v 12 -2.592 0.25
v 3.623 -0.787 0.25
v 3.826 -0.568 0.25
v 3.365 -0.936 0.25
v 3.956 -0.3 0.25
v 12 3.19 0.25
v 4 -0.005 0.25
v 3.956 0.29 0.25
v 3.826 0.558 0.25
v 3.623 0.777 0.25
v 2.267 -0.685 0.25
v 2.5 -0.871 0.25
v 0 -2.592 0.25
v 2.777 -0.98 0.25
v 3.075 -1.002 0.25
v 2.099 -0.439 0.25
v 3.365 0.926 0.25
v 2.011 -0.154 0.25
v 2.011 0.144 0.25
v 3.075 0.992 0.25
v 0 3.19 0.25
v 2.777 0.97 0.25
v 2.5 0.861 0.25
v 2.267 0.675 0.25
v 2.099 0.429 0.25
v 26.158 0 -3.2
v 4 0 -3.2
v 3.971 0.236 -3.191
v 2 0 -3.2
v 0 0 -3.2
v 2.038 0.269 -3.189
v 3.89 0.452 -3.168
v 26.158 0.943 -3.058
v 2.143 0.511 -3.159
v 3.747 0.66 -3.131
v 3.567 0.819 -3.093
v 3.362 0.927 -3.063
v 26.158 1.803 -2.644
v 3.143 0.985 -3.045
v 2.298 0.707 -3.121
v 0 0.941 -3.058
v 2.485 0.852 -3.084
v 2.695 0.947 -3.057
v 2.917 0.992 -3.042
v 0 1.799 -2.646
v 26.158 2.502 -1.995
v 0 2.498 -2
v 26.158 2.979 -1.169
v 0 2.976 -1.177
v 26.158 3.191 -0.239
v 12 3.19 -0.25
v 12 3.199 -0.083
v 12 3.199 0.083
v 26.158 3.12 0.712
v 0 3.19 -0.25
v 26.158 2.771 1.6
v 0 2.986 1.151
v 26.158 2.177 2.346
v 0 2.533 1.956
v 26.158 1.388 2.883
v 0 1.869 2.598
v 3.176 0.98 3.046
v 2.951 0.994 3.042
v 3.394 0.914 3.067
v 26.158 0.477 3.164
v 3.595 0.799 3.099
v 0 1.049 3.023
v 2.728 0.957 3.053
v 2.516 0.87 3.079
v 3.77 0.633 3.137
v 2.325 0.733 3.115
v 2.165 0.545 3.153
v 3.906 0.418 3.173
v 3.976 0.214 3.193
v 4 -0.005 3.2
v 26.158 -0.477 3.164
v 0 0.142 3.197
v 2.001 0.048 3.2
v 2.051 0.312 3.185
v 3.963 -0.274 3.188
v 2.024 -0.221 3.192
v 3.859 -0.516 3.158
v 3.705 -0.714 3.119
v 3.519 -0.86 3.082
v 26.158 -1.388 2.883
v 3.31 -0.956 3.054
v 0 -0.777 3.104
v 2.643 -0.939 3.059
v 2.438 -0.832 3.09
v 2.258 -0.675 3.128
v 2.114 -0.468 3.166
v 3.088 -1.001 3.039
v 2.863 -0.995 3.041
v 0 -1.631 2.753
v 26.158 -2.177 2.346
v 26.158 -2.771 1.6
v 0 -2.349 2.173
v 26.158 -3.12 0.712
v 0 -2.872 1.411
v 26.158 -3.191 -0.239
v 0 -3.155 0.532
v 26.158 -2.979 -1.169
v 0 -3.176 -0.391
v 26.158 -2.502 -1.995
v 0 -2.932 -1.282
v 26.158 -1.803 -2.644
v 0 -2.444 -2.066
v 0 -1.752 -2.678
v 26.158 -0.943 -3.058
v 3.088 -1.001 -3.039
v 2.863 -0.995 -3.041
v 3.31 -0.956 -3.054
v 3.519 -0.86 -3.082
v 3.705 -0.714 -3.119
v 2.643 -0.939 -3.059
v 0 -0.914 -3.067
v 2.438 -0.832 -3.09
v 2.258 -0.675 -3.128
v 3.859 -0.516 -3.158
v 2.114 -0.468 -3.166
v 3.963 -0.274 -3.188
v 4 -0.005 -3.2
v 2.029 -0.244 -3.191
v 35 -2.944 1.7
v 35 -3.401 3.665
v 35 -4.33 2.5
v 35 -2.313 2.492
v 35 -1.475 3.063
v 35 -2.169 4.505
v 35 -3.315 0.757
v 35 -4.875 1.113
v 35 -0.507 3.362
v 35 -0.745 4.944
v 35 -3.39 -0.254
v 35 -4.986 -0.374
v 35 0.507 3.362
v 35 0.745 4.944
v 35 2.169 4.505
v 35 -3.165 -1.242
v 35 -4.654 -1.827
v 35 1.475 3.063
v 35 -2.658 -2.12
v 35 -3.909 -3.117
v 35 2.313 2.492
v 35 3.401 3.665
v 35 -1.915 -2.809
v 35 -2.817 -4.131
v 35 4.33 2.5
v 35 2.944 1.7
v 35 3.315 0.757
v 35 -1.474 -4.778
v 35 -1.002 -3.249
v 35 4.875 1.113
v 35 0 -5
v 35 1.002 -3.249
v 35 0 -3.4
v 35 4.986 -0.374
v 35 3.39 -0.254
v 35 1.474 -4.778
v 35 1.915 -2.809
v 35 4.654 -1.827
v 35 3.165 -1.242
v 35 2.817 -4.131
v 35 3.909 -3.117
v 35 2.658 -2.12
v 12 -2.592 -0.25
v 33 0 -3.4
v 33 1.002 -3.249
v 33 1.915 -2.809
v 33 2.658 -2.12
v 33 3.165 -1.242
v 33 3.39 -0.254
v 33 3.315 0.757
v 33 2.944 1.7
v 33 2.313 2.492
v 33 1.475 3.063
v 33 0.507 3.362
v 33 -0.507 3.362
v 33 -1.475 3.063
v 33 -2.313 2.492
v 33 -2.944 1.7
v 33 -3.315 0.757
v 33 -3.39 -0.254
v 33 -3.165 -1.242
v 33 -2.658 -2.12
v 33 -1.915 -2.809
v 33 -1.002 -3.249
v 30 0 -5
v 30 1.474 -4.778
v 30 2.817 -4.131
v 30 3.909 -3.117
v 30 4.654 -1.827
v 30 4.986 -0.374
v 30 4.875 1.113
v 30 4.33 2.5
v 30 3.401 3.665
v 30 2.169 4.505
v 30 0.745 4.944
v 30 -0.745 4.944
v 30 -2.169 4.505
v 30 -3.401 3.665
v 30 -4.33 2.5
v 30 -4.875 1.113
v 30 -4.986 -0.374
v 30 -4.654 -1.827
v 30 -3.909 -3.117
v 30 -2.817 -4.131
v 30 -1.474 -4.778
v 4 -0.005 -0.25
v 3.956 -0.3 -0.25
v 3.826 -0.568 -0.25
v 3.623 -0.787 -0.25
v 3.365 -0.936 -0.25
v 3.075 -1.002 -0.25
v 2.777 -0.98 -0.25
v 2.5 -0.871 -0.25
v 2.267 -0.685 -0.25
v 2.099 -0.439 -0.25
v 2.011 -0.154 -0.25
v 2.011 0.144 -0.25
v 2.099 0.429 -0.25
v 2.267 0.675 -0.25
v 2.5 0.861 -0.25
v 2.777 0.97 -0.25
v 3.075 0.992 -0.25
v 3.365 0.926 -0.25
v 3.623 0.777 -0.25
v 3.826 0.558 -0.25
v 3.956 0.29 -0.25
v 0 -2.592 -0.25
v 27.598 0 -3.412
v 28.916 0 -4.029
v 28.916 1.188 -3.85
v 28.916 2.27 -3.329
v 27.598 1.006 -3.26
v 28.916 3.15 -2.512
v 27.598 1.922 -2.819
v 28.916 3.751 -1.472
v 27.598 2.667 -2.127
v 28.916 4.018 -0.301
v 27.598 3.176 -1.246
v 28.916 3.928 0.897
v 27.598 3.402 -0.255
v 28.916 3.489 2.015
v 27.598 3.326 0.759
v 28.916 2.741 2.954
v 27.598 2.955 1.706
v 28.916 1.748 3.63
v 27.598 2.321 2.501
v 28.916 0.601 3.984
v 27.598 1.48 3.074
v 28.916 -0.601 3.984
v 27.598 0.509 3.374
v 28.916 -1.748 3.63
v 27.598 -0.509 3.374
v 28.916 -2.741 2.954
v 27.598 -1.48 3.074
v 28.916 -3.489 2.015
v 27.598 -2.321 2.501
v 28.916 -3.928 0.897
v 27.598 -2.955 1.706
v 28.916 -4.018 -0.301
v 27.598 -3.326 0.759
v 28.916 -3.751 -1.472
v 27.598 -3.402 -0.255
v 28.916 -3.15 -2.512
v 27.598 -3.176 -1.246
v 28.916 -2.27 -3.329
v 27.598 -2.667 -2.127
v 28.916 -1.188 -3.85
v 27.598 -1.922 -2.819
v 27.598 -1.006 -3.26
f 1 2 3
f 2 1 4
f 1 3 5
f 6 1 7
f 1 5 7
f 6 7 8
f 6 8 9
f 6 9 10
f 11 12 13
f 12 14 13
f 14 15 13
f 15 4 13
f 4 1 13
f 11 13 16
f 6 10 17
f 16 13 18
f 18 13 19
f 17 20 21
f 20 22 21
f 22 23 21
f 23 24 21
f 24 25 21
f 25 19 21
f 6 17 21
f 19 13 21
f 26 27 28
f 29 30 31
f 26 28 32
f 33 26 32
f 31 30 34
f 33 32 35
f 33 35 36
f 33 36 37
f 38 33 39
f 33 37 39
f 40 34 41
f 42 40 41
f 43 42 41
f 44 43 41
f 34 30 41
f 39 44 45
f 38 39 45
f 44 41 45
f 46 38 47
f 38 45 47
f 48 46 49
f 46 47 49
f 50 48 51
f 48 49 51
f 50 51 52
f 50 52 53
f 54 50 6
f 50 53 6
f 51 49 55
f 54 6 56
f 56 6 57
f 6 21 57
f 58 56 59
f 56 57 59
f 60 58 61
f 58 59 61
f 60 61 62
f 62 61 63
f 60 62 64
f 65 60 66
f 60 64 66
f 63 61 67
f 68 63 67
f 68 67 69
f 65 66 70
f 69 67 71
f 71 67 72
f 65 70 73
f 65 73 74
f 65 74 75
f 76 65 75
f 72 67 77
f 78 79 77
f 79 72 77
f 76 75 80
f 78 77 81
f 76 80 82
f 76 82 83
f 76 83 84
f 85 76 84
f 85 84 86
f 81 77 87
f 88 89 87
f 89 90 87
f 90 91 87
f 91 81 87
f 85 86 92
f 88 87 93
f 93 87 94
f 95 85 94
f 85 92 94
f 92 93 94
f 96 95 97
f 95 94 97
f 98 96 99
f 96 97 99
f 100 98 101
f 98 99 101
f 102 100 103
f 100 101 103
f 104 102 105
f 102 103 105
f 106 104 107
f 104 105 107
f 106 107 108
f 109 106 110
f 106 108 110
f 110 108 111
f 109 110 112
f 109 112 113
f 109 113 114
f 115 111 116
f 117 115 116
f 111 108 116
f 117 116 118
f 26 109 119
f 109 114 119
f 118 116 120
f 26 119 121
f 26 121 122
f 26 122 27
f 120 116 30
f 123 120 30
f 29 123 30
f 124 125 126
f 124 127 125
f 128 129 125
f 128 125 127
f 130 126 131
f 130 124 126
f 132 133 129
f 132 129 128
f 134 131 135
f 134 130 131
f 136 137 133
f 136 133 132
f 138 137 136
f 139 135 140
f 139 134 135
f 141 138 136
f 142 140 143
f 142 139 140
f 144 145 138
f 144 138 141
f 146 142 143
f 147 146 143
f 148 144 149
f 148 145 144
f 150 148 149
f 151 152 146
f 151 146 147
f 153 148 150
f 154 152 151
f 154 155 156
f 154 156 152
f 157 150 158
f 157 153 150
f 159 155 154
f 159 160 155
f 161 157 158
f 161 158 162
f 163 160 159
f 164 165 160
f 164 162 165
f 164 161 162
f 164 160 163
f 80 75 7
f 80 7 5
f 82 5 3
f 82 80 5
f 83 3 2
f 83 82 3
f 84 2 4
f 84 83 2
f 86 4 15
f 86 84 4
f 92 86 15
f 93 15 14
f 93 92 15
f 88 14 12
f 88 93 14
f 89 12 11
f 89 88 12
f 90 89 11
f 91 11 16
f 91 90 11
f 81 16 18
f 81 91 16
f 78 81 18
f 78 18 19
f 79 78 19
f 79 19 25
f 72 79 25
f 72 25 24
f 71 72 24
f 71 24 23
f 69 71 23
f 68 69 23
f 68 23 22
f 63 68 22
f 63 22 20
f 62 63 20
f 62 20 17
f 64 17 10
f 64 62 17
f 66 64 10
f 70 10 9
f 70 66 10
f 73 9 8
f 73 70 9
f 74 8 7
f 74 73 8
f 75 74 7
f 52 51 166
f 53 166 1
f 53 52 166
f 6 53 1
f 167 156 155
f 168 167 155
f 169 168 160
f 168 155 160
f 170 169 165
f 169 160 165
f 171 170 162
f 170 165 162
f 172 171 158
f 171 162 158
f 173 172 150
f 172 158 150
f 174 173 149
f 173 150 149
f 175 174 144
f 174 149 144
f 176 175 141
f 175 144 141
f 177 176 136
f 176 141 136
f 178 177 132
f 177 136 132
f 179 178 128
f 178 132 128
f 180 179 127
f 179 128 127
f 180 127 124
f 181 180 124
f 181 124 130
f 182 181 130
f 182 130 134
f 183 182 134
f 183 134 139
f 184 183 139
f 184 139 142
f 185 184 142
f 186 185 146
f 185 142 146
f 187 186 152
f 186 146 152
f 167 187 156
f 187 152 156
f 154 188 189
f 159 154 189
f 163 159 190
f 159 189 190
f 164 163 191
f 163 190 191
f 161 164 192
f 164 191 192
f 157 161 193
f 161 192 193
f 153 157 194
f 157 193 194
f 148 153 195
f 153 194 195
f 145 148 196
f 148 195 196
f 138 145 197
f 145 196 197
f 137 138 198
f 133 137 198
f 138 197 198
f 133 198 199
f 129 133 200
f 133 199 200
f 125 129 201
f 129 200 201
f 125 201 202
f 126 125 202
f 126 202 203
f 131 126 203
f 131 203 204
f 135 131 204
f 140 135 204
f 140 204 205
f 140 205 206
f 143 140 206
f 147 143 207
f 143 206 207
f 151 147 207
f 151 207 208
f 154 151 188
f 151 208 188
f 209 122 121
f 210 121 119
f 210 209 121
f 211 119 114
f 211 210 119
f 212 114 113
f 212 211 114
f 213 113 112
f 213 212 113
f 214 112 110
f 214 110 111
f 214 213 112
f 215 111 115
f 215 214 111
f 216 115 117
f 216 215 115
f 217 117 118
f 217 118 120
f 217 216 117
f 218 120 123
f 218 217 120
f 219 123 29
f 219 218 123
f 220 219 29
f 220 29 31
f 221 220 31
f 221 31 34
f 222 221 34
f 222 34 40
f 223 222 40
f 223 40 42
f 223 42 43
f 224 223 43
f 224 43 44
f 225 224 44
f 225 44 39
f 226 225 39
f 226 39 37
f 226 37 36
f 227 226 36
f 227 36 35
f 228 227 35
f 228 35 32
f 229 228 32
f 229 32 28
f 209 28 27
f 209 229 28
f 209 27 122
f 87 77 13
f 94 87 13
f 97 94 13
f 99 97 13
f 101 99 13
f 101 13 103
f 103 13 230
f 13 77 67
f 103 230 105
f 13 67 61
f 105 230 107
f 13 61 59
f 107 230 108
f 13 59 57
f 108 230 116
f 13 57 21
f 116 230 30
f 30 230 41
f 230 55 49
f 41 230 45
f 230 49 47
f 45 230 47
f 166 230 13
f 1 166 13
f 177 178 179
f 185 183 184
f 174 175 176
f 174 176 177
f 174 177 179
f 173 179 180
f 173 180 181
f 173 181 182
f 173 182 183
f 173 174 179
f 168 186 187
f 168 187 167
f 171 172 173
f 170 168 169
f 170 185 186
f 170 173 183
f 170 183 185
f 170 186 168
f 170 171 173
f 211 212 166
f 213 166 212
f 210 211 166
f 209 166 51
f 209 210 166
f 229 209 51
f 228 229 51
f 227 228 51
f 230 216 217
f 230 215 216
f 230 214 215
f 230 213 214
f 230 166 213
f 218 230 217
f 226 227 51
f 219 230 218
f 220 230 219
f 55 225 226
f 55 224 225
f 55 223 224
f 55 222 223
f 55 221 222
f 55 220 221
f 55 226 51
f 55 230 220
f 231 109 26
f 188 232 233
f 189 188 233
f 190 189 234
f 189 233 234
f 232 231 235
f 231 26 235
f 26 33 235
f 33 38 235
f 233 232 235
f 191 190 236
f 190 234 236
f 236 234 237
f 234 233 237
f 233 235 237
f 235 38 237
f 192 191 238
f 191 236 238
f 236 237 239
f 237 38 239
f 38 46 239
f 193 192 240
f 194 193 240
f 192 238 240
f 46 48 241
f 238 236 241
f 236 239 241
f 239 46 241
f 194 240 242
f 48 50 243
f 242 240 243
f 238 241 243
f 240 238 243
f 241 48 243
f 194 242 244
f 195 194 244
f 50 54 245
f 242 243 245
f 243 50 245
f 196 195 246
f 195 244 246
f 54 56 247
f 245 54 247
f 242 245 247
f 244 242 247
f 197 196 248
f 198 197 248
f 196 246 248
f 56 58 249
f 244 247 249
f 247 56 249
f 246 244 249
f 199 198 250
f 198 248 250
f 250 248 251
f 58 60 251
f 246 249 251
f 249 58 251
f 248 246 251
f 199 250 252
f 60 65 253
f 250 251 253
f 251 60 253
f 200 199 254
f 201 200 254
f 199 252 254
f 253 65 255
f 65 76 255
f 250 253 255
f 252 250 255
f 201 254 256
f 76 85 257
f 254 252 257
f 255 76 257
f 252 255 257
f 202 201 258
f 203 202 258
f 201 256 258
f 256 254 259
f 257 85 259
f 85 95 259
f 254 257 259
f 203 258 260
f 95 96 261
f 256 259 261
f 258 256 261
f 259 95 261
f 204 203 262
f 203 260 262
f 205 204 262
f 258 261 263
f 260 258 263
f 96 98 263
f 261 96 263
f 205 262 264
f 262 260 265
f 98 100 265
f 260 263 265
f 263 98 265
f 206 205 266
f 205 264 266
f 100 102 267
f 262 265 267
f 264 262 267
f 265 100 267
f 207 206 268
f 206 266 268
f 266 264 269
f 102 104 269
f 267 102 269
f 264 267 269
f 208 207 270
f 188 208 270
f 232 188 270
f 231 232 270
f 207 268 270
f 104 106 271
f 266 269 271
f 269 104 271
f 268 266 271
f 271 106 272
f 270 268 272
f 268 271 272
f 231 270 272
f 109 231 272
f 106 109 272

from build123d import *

# Parameters (mm, degrees)
SKETCH_1_R               = 3.2
EXTRUDE_1_DEPTH          = 30
SKETCH_2_W               = 0.5
SKETCH_2_H               = 6.454336116
CUT_EXTRUDE_1_DEPTH      = 12
CUT_EXTRUDE_2_DEPTH      = 10
CUT_EXTRUDE_2_DEPTH_BACK = 10
SKETCH_3_R               = 1
SKETCH_6_R               = 5
EXTRUDE_2_DEPTH          = 5
FILLET_1_R               = 5
SKETCH_7_R               = 3.4
CUT_EXTRUDE_3_DEPTH      = 2


with BuildPart() as part:
    # 草图1 → 凸台-拉伸1 (new body)
    with BuildSketch(Plane(origin=(0, 0, 0), x_dir=(0, 0, -1), z_dir=(1, 0, 0))):
        Circle(SKETCH_1_R)
    extrude(amount=EXTRUDE_1_DEPTH)

    # 草图2 → 切除-拉伸1 (cut)
    with BuildSketch(Plane.ZY):
        with Locations((0, 0.634798729)):
            Rectangle(SKETCH_2_W, SKETCH_2_H)
    extrude(amount=-CUT_EXTRUDE_1_DEPTH, mode=Mode.SUBTRACT)

    # 草图3 → 切除-拉伸2 (cut, two sides: drawn at the far end of the back side and taken through both)
    with BuildSketch(Plane(origin=(0, 0, 0.25), x_dir=(-1, 0, 0), z_dir=(0, 0, -1)).offset(-CUT_EXTRUDE_2_DEPTH_BACK)):
        with Locations(Location((-3, -0.004890286, 0), (0, 0, 180))):
            Circle(SKETCH_3_R)
    extrude(amount=CUT_EXTRUDE_2_DEPTH + CUT_EXTRUDE_2_DEPTH_BACK, mode=Mode.SUBTRACT)

    # 草图6 → 凸台-拉伸2 (add)
    with BuildSketch(Plane(origin=(30, 0, 0), x_dir=(0, 0, -1), z_dir=(1, 0, 0))):
        Circle(SKETCH_6_R)
    extrude(amount=EXTRUDE_2_DEPTH)

    # 圆角1
    # the kernel refuses this fillet: 5 mm, written as the material it adds along each edge
    with BuildSketch(Plane(origin=(30, 0, 0), x_dir=(0, 0, -1), z_dir=(0, -1, 0))) as fillet_1_piece_1:
        with BuildLine():
            CenterArc((8.2, -3.841874542), FILLET_1_R, 129.7918195, 50.2081805)
            Line((3.2, -3.841874542), (3.1, -3.841874542))
            Line((3.1, -3.841874542), (3.1, 0))
            Line((3.1, 0), (3.2, 0.1))
            ThreePointArc((3.2, 0.1), (4.1, 0.1), (4.936, 0.076837491))
            Line((4.936, 0.076837491), (5, 0))
        make_face()
    revolve(axis=Axis((30, 0, 0), (1, 0, 0)))

    # 草图7 → 切除-拉伸3 (cut)
    with BuildSketch(Plane(origin=(35, 0, 0), x_dir=(0, 0, -1), z_dir=(1, 0, 0))):
        Circle(SKETCH_7_R)
    extrude(amount=-CUT_EXTRUDE_3_DEPTH, mode=Mode.SUBTRACT)


solid = part.part
